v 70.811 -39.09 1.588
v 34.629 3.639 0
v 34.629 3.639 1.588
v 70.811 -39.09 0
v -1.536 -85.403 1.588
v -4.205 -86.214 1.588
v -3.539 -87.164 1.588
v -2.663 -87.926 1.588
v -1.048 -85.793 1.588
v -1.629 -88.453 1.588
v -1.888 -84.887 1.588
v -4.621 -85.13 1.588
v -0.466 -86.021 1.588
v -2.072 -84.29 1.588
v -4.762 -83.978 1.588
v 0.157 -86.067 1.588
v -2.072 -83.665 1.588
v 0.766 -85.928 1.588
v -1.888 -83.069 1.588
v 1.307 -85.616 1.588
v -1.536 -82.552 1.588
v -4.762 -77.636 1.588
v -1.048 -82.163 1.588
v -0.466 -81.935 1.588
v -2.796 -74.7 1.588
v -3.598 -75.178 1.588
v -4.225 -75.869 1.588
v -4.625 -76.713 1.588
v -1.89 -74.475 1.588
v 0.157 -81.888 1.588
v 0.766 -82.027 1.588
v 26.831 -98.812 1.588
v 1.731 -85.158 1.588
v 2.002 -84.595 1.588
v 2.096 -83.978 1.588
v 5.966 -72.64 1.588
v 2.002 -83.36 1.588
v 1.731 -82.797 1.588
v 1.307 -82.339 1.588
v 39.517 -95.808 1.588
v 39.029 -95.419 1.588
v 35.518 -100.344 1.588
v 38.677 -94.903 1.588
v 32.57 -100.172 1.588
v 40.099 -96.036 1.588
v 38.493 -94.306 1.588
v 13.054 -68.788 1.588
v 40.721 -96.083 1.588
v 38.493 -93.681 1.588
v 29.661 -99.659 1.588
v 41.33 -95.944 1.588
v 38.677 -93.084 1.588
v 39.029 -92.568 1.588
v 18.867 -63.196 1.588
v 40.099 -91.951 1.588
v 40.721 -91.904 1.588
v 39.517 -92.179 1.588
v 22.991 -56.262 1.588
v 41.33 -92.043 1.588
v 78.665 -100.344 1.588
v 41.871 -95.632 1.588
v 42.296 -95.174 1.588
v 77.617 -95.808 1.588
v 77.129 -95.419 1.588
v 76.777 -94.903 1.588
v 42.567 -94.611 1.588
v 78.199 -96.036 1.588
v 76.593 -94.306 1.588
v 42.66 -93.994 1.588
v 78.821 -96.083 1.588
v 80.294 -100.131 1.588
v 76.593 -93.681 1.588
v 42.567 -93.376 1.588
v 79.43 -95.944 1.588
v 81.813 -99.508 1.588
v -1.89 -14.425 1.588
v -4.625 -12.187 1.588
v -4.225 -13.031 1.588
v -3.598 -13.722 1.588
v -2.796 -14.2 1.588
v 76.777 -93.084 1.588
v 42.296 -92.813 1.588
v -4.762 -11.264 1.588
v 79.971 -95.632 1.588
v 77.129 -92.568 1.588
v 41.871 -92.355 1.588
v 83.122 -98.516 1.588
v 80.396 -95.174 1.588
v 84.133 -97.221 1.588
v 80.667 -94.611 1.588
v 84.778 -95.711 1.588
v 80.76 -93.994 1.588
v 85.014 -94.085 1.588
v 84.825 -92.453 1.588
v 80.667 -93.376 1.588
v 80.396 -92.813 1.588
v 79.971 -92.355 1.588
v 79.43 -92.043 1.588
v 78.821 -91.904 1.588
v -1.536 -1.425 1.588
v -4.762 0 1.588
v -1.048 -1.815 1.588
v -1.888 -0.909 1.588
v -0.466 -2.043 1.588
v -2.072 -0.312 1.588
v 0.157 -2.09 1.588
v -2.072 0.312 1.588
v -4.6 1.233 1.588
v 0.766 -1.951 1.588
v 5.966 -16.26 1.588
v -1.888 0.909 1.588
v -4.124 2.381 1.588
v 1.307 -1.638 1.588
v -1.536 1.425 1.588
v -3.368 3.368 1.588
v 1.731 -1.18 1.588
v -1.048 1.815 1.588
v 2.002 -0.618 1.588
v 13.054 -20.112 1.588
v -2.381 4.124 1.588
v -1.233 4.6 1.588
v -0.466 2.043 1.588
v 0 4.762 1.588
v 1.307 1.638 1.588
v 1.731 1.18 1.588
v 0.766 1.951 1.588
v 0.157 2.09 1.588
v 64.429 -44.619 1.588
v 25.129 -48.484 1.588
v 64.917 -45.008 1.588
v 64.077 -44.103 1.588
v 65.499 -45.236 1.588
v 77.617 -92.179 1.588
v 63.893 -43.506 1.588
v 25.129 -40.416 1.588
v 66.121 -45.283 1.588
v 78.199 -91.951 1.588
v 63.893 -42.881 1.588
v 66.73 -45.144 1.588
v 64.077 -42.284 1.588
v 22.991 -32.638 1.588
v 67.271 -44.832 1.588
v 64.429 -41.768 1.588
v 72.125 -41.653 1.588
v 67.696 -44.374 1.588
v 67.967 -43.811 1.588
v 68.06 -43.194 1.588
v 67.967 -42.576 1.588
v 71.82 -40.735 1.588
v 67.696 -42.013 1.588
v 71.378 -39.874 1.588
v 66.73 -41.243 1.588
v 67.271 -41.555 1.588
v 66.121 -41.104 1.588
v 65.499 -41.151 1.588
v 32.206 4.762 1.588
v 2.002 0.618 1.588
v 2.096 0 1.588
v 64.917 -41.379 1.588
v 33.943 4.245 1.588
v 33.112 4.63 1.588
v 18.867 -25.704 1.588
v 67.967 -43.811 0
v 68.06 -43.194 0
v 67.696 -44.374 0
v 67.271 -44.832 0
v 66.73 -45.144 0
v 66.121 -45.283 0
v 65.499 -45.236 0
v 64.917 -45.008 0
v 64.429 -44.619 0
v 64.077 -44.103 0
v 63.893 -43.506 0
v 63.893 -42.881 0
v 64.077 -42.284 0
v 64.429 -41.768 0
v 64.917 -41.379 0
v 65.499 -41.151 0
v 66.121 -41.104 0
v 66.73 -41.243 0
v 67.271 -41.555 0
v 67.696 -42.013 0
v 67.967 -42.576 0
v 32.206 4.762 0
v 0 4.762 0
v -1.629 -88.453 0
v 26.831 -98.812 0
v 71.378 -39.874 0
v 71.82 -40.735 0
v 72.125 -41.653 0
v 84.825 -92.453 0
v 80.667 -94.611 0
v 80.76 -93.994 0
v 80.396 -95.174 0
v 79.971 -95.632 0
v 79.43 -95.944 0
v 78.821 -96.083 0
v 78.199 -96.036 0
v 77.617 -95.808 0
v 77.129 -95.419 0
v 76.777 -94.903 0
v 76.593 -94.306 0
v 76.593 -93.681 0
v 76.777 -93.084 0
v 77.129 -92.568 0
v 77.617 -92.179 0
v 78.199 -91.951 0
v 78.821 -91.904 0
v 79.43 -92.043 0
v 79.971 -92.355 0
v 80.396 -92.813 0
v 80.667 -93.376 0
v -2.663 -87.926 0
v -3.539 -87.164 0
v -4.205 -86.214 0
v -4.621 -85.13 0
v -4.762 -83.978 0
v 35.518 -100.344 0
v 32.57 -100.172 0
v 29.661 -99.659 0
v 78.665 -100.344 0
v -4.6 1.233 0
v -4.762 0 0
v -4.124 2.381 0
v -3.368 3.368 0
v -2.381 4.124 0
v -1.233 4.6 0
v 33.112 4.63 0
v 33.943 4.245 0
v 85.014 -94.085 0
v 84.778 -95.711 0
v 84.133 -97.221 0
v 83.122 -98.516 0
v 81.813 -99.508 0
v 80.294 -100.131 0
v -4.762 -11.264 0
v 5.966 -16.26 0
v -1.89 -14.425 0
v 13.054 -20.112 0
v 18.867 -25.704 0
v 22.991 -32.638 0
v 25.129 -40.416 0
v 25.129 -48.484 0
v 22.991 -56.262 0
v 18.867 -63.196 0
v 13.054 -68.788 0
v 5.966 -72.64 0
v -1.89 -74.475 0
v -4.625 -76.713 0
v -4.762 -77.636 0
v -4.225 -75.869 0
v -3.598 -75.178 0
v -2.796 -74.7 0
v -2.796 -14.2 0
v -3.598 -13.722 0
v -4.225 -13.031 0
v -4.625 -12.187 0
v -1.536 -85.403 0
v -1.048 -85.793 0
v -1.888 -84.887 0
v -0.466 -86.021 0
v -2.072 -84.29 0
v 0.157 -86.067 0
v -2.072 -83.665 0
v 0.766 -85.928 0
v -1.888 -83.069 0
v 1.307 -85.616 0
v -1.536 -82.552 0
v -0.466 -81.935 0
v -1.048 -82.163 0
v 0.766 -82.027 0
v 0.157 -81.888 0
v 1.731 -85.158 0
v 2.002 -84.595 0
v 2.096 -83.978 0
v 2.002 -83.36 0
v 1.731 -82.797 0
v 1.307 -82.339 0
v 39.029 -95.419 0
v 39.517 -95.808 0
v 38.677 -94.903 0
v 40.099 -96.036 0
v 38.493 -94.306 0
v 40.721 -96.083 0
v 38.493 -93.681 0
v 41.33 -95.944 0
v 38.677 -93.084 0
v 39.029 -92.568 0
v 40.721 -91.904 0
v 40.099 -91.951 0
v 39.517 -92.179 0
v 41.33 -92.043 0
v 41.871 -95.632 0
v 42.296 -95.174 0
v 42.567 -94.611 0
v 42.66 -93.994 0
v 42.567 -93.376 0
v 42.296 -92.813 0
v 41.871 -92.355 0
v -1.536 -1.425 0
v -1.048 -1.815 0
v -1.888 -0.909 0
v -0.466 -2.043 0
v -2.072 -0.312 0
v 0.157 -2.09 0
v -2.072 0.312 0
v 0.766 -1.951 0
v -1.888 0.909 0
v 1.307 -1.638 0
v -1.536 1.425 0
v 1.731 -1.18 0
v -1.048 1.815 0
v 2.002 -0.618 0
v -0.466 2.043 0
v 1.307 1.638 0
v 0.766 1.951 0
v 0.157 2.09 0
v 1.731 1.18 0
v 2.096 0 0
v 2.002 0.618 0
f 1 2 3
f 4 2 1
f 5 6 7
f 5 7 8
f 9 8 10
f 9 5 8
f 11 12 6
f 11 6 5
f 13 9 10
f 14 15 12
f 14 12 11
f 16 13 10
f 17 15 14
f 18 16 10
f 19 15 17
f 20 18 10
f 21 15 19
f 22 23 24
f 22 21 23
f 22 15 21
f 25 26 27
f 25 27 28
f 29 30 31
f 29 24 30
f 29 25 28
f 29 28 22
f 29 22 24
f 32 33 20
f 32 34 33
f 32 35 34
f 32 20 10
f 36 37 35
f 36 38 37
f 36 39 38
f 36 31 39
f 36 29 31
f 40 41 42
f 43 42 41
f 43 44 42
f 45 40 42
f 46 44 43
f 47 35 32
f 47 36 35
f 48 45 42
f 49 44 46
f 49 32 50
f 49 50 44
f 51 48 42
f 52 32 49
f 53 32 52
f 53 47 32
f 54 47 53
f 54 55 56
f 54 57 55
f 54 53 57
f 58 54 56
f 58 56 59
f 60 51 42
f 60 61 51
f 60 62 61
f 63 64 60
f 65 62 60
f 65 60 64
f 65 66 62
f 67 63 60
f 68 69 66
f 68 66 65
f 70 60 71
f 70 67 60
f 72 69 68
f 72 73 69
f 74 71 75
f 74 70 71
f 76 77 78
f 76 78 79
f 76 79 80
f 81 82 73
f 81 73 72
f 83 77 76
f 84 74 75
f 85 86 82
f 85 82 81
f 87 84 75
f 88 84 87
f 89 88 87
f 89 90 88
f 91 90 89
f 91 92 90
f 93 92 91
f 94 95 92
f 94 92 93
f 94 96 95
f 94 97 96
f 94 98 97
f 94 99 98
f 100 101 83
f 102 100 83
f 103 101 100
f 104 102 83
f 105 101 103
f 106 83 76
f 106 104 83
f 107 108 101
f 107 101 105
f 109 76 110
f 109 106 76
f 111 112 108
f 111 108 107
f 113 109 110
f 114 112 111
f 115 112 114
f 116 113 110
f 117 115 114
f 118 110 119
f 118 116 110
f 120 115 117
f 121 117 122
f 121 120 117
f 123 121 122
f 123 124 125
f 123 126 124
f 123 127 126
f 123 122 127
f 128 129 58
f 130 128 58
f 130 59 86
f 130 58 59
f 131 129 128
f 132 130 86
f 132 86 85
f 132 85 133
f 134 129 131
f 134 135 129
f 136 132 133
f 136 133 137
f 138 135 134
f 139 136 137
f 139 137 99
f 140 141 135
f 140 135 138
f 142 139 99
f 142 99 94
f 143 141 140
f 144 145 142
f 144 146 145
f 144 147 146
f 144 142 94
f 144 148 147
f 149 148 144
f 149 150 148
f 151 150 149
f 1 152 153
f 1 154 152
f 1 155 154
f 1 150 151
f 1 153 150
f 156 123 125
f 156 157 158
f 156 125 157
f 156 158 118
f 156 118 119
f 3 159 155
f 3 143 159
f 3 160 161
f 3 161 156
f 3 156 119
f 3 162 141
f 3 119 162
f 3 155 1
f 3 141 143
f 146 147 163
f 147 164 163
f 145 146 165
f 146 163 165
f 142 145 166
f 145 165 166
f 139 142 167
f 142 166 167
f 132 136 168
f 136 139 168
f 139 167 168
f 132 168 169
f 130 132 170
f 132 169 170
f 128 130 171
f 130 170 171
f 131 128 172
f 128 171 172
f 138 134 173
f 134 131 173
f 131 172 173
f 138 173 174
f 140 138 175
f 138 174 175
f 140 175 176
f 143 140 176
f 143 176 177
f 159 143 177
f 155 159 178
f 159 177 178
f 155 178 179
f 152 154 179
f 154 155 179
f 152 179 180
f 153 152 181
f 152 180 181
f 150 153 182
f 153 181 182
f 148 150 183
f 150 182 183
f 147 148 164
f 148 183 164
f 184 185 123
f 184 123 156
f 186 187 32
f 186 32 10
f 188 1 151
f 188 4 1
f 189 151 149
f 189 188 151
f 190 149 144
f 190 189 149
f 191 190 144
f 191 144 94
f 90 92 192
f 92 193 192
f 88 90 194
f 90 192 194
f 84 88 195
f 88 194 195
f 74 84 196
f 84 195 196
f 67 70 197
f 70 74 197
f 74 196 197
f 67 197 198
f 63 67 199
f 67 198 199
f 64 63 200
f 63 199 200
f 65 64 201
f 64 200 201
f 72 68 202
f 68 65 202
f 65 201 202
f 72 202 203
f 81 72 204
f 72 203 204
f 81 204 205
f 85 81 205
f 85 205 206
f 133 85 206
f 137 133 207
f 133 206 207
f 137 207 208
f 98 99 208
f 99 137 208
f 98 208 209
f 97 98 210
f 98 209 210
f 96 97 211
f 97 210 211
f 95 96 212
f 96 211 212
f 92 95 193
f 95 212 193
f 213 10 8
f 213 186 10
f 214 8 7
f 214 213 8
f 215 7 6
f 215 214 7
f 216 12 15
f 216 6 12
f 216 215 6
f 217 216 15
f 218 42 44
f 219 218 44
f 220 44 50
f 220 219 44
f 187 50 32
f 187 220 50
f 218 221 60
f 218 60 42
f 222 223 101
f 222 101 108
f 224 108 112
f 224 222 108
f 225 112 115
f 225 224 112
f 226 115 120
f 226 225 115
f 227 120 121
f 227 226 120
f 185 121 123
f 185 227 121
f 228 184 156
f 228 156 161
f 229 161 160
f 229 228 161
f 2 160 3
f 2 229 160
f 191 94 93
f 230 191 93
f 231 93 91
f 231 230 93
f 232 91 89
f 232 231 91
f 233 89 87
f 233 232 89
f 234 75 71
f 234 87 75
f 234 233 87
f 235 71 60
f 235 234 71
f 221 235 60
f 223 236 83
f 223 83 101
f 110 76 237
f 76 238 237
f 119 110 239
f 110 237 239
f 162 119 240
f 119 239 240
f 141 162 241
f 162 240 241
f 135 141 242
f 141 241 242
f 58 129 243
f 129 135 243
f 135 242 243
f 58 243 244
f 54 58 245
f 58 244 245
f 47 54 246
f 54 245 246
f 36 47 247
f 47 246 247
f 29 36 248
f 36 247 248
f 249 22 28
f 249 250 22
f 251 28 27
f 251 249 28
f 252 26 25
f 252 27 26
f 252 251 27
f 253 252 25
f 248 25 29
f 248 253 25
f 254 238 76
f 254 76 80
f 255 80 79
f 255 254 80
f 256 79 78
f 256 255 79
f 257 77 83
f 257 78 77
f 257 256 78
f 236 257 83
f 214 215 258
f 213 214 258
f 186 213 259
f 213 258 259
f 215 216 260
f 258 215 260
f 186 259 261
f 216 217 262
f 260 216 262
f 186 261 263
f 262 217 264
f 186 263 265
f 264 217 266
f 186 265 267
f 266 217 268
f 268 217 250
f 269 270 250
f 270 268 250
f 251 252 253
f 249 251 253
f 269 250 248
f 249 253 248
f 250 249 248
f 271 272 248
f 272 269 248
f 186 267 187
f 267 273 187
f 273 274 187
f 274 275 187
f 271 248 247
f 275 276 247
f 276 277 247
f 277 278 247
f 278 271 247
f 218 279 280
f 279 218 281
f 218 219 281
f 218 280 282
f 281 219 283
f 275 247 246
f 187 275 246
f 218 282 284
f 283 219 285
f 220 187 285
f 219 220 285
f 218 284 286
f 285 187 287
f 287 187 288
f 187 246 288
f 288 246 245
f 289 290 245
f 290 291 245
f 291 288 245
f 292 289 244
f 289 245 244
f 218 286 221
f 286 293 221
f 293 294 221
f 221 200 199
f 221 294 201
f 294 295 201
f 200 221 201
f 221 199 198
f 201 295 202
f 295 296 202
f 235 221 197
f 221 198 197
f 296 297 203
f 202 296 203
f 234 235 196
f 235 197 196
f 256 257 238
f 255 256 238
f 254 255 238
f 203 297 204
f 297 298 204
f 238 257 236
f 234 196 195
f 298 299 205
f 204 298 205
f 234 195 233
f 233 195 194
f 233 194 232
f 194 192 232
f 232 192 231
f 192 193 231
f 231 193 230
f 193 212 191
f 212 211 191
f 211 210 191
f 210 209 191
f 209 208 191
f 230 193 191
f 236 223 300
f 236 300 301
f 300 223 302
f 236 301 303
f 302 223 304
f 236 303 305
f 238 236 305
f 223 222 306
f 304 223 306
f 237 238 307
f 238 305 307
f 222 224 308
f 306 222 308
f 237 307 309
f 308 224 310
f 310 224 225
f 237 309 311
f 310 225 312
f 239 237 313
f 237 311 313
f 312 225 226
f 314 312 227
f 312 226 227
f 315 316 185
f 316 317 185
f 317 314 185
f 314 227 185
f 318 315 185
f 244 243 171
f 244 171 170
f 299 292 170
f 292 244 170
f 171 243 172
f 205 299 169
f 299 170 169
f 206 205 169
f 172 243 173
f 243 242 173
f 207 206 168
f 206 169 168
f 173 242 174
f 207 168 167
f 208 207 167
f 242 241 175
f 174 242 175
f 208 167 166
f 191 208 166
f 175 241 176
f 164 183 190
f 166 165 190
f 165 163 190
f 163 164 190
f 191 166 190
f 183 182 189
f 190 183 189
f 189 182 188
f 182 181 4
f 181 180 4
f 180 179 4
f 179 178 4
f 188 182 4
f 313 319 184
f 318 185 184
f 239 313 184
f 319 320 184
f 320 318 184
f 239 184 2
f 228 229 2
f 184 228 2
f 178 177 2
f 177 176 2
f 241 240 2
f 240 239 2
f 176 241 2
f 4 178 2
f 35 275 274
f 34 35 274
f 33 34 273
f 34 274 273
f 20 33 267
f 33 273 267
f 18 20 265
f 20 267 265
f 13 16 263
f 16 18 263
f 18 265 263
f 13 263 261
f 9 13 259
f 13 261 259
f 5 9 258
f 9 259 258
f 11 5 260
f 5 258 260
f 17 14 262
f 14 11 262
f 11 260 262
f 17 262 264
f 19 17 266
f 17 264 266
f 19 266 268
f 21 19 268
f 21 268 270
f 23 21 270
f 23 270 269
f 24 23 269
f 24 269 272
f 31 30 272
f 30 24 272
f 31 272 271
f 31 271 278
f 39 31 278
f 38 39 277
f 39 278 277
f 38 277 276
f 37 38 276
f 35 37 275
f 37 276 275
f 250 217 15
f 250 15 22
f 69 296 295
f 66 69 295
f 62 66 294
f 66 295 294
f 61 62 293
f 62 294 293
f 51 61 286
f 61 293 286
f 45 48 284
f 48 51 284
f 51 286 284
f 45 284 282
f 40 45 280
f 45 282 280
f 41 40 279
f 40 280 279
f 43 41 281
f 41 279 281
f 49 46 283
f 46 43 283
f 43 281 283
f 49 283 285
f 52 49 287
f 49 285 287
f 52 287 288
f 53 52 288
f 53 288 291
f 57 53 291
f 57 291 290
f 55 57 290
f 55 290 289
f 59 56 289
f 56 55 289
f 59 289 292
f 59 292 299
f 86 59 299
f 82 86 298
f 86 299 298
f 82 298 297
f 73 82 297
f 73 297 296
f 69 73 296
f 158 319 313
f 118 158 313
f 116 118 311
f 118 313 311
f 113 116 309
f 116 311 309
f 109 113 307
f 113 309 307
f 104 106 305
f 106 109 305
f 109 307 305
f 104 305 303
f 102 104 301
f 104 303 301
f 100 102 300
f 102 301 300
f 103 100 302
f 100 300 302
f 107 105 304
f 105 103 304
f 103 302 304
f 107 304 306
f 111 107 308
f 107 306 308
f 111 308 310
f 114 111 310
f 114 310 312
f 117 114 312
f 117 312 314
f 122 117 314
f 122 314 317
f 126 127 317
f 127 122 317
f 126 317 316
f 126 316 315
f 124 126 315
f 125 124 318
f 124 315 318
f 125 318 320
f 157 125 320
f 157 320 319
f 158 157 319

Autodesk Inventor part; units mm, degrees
ref_plane "YZ Plane" through (0, 0, 0) normal (1, 0, 0) x (0, 1, 0)
ref_plane "XZ Plane" through (0, 0, 0) normal (0, 1, 0) x (-1, 0, 0)
ref_plane "XY Plane" through (0, 0, 0) normal (0, 0, 1) x (1, 0, 0)
sketch "main" plane through (0, 0, 0) normal (0, 0, 1) x (1, 0, 0)
  line L0 (57.2021, -70.0851) -> (14.0558, -70.0851)
  line L1 (5.3685, -68.5533) -> (-23.0916, -58.1947)
  line L2 (-26.2252, -53.7194) -> (-26.2252, -47.3776)
  arc A0 (-23.3526, -44.217) -> (-23.3526, 15.8337) centre (-26.2252, -14.1917) ccw
  line L3 (-26.2252, 18.9943) -> (-26.2252, 30.2583)
  line L4 (-21.4627, 35.0208) -> (10.7437, 35.0208)
  line L5 (13.1667, 33.8976) -> (49.3481, -8.8317)
  arc A1 (-21.4627, 35.0208) -> (-26.2252, 30.2583) centre (-21.4627, 30.2583) ccw
  circle A2 centre (-21.4627, 30.2583) radius 2.0955
  arc A3 (-26.2252, 18.9943) -> (-23.3526, 15.8337) centre (-23.0502, 18.9943) ccw
  arc A4 (-23.3526, -44.217) -> (-26.2252, -47.3776) centre (-23.0502, -47.3776) ccw
  arc A5 (-26.2252, -53.7194) -> (-23.0916, -58.1947) centre (-21.4627, -53.7194) ccw
  circle A6 centre (-21.4627, -53.7194) radius 2.0955
  arc A7 (13.1667, 33.8976) -> (10.7437, 35.0208) centre (10.7437, 31.8458) ccw
  circle A8 centre (57.2021, -63.7351) radius 2.0955
  arc A9 (50.6625, -11.395) -> (49.3481, -8.8317) centre (44.5021, -12.9351) ccw
  circle A10 centre (44.5021, -12.9351) radius 2.0955
  line L6 (50.6625, -11.395) -> (63.3625, -62.195)
  arc A11 (57.2021, -70.0851) -> (63.3625, -62.195) centre (57.2021, -63.7351) ccw
  circle A12 centre (19.1021, -63.7351) radius 2.0955
  arc A13 (5.3685, -68.5533) -> (14.0558, -70.0851) centre (14.0558, -44.6851) ccw
  point P0 (-12.3105, 3.8443)
  point P1 (9.5771, -70.0851)
  point P2 (-26.2252, -57.0542)
  point P3 (-26.2252, -44.3542)
  point P4 (-26.2252, 15.9708)
  point P5 (-26.2252, 35.0208)
  point P6 (20.6896, -70.0851)
  dimension "d14" = 38.1
  dimension "d15" = 160
  dimension "d16" = 12.7
  dimension "d17" = 19.05
  dimension "d18" = 4.7625
  dimension "d19" = 4.191
  dimension "d20" = 3.175
  dimension "d21" = 4.7625
  dimension "d22" = 4.191
  dimension "d23" = 4.191
  dimension "d24" = 4.191
  dimension "d25" = 4.191
  dimension "d26" = 25.4
sketch "Sketch1" plane through (0, 0, 0) normal (0, 0, 1) x (1, 0, 0)
  line L0 (78.6648, -100.3435) -> (35.5185, -100.3435)
  line L1 (26.8312, -98.8117) -> (-1.6289, -88.453)
  line L2 (-4.7625, -83.9778) -> (-4.7625, -77.636)
  arc A0 (-1.8899, -74.4754) -> (-1.8899, -14.4246) centre (-4.7625, -44.45) ccw
  line L3 (-4.7625, -11.264) -> (-4.7625, 0)
  line L4 (0, 4.7625) -> (32.2064, 4.7625)
  line L5 (34.6294, 3.6392) -> (70.8108, -39.09)
  arc A1 (0, 4.7625) -> (-4.7625, 0) centre (0, 0) ccw
  circle A2 centre (0, 0) radius 2.0955
  arc A3 (-4.7625, -11.264) -> (-1.8899, -14.4246) centre (-1.5875, -11.264) ccw
  arc A4 (-1.8899, -74.4754) -> (-4.7625, -77.636) centre (-1.5875, -77.636) ccw
  arc A5 (-4.7625, -83.9778) -> (-1.6289, -88.453) centre (0, -83.9778) ccw
  circle A6 centre (0, -83.9778) radius 2.0955
  arc A7 (34.6294, 3.6392) -> (32.2064, 4.7625) centre (32.2064, 1.5875) ccw
  circle A8 centre (78.6648, -93.9935) radius 2.0955
  arc A9 (72.1252, -41.6534) -> (70.8108, -39.09) centre (65.9648, -43.1935) ccw
  circle A10 centre (65.9648, -43.1935) radius 2.0955
  line L6 (72.1252, -41.6534) -> (84.8252, -92.4534)
  arc A11 (78.6648, -100.3435) -> (84.8252, -92.4534) centre (78.6648, -93.9935) ccw
  circle A12 centre (40.5648, -93.9935) radius 2.0955
  arc A13 (26.8312, -98.8117) -> (35.5185, -100.3435) centre (35.5185, -74.9435) ccw
extrude "Extrusion1" add sketch "Sketch1" along normal blind 1.5875
properties part number "hang_gusset" material "Acetal Resin, White"
